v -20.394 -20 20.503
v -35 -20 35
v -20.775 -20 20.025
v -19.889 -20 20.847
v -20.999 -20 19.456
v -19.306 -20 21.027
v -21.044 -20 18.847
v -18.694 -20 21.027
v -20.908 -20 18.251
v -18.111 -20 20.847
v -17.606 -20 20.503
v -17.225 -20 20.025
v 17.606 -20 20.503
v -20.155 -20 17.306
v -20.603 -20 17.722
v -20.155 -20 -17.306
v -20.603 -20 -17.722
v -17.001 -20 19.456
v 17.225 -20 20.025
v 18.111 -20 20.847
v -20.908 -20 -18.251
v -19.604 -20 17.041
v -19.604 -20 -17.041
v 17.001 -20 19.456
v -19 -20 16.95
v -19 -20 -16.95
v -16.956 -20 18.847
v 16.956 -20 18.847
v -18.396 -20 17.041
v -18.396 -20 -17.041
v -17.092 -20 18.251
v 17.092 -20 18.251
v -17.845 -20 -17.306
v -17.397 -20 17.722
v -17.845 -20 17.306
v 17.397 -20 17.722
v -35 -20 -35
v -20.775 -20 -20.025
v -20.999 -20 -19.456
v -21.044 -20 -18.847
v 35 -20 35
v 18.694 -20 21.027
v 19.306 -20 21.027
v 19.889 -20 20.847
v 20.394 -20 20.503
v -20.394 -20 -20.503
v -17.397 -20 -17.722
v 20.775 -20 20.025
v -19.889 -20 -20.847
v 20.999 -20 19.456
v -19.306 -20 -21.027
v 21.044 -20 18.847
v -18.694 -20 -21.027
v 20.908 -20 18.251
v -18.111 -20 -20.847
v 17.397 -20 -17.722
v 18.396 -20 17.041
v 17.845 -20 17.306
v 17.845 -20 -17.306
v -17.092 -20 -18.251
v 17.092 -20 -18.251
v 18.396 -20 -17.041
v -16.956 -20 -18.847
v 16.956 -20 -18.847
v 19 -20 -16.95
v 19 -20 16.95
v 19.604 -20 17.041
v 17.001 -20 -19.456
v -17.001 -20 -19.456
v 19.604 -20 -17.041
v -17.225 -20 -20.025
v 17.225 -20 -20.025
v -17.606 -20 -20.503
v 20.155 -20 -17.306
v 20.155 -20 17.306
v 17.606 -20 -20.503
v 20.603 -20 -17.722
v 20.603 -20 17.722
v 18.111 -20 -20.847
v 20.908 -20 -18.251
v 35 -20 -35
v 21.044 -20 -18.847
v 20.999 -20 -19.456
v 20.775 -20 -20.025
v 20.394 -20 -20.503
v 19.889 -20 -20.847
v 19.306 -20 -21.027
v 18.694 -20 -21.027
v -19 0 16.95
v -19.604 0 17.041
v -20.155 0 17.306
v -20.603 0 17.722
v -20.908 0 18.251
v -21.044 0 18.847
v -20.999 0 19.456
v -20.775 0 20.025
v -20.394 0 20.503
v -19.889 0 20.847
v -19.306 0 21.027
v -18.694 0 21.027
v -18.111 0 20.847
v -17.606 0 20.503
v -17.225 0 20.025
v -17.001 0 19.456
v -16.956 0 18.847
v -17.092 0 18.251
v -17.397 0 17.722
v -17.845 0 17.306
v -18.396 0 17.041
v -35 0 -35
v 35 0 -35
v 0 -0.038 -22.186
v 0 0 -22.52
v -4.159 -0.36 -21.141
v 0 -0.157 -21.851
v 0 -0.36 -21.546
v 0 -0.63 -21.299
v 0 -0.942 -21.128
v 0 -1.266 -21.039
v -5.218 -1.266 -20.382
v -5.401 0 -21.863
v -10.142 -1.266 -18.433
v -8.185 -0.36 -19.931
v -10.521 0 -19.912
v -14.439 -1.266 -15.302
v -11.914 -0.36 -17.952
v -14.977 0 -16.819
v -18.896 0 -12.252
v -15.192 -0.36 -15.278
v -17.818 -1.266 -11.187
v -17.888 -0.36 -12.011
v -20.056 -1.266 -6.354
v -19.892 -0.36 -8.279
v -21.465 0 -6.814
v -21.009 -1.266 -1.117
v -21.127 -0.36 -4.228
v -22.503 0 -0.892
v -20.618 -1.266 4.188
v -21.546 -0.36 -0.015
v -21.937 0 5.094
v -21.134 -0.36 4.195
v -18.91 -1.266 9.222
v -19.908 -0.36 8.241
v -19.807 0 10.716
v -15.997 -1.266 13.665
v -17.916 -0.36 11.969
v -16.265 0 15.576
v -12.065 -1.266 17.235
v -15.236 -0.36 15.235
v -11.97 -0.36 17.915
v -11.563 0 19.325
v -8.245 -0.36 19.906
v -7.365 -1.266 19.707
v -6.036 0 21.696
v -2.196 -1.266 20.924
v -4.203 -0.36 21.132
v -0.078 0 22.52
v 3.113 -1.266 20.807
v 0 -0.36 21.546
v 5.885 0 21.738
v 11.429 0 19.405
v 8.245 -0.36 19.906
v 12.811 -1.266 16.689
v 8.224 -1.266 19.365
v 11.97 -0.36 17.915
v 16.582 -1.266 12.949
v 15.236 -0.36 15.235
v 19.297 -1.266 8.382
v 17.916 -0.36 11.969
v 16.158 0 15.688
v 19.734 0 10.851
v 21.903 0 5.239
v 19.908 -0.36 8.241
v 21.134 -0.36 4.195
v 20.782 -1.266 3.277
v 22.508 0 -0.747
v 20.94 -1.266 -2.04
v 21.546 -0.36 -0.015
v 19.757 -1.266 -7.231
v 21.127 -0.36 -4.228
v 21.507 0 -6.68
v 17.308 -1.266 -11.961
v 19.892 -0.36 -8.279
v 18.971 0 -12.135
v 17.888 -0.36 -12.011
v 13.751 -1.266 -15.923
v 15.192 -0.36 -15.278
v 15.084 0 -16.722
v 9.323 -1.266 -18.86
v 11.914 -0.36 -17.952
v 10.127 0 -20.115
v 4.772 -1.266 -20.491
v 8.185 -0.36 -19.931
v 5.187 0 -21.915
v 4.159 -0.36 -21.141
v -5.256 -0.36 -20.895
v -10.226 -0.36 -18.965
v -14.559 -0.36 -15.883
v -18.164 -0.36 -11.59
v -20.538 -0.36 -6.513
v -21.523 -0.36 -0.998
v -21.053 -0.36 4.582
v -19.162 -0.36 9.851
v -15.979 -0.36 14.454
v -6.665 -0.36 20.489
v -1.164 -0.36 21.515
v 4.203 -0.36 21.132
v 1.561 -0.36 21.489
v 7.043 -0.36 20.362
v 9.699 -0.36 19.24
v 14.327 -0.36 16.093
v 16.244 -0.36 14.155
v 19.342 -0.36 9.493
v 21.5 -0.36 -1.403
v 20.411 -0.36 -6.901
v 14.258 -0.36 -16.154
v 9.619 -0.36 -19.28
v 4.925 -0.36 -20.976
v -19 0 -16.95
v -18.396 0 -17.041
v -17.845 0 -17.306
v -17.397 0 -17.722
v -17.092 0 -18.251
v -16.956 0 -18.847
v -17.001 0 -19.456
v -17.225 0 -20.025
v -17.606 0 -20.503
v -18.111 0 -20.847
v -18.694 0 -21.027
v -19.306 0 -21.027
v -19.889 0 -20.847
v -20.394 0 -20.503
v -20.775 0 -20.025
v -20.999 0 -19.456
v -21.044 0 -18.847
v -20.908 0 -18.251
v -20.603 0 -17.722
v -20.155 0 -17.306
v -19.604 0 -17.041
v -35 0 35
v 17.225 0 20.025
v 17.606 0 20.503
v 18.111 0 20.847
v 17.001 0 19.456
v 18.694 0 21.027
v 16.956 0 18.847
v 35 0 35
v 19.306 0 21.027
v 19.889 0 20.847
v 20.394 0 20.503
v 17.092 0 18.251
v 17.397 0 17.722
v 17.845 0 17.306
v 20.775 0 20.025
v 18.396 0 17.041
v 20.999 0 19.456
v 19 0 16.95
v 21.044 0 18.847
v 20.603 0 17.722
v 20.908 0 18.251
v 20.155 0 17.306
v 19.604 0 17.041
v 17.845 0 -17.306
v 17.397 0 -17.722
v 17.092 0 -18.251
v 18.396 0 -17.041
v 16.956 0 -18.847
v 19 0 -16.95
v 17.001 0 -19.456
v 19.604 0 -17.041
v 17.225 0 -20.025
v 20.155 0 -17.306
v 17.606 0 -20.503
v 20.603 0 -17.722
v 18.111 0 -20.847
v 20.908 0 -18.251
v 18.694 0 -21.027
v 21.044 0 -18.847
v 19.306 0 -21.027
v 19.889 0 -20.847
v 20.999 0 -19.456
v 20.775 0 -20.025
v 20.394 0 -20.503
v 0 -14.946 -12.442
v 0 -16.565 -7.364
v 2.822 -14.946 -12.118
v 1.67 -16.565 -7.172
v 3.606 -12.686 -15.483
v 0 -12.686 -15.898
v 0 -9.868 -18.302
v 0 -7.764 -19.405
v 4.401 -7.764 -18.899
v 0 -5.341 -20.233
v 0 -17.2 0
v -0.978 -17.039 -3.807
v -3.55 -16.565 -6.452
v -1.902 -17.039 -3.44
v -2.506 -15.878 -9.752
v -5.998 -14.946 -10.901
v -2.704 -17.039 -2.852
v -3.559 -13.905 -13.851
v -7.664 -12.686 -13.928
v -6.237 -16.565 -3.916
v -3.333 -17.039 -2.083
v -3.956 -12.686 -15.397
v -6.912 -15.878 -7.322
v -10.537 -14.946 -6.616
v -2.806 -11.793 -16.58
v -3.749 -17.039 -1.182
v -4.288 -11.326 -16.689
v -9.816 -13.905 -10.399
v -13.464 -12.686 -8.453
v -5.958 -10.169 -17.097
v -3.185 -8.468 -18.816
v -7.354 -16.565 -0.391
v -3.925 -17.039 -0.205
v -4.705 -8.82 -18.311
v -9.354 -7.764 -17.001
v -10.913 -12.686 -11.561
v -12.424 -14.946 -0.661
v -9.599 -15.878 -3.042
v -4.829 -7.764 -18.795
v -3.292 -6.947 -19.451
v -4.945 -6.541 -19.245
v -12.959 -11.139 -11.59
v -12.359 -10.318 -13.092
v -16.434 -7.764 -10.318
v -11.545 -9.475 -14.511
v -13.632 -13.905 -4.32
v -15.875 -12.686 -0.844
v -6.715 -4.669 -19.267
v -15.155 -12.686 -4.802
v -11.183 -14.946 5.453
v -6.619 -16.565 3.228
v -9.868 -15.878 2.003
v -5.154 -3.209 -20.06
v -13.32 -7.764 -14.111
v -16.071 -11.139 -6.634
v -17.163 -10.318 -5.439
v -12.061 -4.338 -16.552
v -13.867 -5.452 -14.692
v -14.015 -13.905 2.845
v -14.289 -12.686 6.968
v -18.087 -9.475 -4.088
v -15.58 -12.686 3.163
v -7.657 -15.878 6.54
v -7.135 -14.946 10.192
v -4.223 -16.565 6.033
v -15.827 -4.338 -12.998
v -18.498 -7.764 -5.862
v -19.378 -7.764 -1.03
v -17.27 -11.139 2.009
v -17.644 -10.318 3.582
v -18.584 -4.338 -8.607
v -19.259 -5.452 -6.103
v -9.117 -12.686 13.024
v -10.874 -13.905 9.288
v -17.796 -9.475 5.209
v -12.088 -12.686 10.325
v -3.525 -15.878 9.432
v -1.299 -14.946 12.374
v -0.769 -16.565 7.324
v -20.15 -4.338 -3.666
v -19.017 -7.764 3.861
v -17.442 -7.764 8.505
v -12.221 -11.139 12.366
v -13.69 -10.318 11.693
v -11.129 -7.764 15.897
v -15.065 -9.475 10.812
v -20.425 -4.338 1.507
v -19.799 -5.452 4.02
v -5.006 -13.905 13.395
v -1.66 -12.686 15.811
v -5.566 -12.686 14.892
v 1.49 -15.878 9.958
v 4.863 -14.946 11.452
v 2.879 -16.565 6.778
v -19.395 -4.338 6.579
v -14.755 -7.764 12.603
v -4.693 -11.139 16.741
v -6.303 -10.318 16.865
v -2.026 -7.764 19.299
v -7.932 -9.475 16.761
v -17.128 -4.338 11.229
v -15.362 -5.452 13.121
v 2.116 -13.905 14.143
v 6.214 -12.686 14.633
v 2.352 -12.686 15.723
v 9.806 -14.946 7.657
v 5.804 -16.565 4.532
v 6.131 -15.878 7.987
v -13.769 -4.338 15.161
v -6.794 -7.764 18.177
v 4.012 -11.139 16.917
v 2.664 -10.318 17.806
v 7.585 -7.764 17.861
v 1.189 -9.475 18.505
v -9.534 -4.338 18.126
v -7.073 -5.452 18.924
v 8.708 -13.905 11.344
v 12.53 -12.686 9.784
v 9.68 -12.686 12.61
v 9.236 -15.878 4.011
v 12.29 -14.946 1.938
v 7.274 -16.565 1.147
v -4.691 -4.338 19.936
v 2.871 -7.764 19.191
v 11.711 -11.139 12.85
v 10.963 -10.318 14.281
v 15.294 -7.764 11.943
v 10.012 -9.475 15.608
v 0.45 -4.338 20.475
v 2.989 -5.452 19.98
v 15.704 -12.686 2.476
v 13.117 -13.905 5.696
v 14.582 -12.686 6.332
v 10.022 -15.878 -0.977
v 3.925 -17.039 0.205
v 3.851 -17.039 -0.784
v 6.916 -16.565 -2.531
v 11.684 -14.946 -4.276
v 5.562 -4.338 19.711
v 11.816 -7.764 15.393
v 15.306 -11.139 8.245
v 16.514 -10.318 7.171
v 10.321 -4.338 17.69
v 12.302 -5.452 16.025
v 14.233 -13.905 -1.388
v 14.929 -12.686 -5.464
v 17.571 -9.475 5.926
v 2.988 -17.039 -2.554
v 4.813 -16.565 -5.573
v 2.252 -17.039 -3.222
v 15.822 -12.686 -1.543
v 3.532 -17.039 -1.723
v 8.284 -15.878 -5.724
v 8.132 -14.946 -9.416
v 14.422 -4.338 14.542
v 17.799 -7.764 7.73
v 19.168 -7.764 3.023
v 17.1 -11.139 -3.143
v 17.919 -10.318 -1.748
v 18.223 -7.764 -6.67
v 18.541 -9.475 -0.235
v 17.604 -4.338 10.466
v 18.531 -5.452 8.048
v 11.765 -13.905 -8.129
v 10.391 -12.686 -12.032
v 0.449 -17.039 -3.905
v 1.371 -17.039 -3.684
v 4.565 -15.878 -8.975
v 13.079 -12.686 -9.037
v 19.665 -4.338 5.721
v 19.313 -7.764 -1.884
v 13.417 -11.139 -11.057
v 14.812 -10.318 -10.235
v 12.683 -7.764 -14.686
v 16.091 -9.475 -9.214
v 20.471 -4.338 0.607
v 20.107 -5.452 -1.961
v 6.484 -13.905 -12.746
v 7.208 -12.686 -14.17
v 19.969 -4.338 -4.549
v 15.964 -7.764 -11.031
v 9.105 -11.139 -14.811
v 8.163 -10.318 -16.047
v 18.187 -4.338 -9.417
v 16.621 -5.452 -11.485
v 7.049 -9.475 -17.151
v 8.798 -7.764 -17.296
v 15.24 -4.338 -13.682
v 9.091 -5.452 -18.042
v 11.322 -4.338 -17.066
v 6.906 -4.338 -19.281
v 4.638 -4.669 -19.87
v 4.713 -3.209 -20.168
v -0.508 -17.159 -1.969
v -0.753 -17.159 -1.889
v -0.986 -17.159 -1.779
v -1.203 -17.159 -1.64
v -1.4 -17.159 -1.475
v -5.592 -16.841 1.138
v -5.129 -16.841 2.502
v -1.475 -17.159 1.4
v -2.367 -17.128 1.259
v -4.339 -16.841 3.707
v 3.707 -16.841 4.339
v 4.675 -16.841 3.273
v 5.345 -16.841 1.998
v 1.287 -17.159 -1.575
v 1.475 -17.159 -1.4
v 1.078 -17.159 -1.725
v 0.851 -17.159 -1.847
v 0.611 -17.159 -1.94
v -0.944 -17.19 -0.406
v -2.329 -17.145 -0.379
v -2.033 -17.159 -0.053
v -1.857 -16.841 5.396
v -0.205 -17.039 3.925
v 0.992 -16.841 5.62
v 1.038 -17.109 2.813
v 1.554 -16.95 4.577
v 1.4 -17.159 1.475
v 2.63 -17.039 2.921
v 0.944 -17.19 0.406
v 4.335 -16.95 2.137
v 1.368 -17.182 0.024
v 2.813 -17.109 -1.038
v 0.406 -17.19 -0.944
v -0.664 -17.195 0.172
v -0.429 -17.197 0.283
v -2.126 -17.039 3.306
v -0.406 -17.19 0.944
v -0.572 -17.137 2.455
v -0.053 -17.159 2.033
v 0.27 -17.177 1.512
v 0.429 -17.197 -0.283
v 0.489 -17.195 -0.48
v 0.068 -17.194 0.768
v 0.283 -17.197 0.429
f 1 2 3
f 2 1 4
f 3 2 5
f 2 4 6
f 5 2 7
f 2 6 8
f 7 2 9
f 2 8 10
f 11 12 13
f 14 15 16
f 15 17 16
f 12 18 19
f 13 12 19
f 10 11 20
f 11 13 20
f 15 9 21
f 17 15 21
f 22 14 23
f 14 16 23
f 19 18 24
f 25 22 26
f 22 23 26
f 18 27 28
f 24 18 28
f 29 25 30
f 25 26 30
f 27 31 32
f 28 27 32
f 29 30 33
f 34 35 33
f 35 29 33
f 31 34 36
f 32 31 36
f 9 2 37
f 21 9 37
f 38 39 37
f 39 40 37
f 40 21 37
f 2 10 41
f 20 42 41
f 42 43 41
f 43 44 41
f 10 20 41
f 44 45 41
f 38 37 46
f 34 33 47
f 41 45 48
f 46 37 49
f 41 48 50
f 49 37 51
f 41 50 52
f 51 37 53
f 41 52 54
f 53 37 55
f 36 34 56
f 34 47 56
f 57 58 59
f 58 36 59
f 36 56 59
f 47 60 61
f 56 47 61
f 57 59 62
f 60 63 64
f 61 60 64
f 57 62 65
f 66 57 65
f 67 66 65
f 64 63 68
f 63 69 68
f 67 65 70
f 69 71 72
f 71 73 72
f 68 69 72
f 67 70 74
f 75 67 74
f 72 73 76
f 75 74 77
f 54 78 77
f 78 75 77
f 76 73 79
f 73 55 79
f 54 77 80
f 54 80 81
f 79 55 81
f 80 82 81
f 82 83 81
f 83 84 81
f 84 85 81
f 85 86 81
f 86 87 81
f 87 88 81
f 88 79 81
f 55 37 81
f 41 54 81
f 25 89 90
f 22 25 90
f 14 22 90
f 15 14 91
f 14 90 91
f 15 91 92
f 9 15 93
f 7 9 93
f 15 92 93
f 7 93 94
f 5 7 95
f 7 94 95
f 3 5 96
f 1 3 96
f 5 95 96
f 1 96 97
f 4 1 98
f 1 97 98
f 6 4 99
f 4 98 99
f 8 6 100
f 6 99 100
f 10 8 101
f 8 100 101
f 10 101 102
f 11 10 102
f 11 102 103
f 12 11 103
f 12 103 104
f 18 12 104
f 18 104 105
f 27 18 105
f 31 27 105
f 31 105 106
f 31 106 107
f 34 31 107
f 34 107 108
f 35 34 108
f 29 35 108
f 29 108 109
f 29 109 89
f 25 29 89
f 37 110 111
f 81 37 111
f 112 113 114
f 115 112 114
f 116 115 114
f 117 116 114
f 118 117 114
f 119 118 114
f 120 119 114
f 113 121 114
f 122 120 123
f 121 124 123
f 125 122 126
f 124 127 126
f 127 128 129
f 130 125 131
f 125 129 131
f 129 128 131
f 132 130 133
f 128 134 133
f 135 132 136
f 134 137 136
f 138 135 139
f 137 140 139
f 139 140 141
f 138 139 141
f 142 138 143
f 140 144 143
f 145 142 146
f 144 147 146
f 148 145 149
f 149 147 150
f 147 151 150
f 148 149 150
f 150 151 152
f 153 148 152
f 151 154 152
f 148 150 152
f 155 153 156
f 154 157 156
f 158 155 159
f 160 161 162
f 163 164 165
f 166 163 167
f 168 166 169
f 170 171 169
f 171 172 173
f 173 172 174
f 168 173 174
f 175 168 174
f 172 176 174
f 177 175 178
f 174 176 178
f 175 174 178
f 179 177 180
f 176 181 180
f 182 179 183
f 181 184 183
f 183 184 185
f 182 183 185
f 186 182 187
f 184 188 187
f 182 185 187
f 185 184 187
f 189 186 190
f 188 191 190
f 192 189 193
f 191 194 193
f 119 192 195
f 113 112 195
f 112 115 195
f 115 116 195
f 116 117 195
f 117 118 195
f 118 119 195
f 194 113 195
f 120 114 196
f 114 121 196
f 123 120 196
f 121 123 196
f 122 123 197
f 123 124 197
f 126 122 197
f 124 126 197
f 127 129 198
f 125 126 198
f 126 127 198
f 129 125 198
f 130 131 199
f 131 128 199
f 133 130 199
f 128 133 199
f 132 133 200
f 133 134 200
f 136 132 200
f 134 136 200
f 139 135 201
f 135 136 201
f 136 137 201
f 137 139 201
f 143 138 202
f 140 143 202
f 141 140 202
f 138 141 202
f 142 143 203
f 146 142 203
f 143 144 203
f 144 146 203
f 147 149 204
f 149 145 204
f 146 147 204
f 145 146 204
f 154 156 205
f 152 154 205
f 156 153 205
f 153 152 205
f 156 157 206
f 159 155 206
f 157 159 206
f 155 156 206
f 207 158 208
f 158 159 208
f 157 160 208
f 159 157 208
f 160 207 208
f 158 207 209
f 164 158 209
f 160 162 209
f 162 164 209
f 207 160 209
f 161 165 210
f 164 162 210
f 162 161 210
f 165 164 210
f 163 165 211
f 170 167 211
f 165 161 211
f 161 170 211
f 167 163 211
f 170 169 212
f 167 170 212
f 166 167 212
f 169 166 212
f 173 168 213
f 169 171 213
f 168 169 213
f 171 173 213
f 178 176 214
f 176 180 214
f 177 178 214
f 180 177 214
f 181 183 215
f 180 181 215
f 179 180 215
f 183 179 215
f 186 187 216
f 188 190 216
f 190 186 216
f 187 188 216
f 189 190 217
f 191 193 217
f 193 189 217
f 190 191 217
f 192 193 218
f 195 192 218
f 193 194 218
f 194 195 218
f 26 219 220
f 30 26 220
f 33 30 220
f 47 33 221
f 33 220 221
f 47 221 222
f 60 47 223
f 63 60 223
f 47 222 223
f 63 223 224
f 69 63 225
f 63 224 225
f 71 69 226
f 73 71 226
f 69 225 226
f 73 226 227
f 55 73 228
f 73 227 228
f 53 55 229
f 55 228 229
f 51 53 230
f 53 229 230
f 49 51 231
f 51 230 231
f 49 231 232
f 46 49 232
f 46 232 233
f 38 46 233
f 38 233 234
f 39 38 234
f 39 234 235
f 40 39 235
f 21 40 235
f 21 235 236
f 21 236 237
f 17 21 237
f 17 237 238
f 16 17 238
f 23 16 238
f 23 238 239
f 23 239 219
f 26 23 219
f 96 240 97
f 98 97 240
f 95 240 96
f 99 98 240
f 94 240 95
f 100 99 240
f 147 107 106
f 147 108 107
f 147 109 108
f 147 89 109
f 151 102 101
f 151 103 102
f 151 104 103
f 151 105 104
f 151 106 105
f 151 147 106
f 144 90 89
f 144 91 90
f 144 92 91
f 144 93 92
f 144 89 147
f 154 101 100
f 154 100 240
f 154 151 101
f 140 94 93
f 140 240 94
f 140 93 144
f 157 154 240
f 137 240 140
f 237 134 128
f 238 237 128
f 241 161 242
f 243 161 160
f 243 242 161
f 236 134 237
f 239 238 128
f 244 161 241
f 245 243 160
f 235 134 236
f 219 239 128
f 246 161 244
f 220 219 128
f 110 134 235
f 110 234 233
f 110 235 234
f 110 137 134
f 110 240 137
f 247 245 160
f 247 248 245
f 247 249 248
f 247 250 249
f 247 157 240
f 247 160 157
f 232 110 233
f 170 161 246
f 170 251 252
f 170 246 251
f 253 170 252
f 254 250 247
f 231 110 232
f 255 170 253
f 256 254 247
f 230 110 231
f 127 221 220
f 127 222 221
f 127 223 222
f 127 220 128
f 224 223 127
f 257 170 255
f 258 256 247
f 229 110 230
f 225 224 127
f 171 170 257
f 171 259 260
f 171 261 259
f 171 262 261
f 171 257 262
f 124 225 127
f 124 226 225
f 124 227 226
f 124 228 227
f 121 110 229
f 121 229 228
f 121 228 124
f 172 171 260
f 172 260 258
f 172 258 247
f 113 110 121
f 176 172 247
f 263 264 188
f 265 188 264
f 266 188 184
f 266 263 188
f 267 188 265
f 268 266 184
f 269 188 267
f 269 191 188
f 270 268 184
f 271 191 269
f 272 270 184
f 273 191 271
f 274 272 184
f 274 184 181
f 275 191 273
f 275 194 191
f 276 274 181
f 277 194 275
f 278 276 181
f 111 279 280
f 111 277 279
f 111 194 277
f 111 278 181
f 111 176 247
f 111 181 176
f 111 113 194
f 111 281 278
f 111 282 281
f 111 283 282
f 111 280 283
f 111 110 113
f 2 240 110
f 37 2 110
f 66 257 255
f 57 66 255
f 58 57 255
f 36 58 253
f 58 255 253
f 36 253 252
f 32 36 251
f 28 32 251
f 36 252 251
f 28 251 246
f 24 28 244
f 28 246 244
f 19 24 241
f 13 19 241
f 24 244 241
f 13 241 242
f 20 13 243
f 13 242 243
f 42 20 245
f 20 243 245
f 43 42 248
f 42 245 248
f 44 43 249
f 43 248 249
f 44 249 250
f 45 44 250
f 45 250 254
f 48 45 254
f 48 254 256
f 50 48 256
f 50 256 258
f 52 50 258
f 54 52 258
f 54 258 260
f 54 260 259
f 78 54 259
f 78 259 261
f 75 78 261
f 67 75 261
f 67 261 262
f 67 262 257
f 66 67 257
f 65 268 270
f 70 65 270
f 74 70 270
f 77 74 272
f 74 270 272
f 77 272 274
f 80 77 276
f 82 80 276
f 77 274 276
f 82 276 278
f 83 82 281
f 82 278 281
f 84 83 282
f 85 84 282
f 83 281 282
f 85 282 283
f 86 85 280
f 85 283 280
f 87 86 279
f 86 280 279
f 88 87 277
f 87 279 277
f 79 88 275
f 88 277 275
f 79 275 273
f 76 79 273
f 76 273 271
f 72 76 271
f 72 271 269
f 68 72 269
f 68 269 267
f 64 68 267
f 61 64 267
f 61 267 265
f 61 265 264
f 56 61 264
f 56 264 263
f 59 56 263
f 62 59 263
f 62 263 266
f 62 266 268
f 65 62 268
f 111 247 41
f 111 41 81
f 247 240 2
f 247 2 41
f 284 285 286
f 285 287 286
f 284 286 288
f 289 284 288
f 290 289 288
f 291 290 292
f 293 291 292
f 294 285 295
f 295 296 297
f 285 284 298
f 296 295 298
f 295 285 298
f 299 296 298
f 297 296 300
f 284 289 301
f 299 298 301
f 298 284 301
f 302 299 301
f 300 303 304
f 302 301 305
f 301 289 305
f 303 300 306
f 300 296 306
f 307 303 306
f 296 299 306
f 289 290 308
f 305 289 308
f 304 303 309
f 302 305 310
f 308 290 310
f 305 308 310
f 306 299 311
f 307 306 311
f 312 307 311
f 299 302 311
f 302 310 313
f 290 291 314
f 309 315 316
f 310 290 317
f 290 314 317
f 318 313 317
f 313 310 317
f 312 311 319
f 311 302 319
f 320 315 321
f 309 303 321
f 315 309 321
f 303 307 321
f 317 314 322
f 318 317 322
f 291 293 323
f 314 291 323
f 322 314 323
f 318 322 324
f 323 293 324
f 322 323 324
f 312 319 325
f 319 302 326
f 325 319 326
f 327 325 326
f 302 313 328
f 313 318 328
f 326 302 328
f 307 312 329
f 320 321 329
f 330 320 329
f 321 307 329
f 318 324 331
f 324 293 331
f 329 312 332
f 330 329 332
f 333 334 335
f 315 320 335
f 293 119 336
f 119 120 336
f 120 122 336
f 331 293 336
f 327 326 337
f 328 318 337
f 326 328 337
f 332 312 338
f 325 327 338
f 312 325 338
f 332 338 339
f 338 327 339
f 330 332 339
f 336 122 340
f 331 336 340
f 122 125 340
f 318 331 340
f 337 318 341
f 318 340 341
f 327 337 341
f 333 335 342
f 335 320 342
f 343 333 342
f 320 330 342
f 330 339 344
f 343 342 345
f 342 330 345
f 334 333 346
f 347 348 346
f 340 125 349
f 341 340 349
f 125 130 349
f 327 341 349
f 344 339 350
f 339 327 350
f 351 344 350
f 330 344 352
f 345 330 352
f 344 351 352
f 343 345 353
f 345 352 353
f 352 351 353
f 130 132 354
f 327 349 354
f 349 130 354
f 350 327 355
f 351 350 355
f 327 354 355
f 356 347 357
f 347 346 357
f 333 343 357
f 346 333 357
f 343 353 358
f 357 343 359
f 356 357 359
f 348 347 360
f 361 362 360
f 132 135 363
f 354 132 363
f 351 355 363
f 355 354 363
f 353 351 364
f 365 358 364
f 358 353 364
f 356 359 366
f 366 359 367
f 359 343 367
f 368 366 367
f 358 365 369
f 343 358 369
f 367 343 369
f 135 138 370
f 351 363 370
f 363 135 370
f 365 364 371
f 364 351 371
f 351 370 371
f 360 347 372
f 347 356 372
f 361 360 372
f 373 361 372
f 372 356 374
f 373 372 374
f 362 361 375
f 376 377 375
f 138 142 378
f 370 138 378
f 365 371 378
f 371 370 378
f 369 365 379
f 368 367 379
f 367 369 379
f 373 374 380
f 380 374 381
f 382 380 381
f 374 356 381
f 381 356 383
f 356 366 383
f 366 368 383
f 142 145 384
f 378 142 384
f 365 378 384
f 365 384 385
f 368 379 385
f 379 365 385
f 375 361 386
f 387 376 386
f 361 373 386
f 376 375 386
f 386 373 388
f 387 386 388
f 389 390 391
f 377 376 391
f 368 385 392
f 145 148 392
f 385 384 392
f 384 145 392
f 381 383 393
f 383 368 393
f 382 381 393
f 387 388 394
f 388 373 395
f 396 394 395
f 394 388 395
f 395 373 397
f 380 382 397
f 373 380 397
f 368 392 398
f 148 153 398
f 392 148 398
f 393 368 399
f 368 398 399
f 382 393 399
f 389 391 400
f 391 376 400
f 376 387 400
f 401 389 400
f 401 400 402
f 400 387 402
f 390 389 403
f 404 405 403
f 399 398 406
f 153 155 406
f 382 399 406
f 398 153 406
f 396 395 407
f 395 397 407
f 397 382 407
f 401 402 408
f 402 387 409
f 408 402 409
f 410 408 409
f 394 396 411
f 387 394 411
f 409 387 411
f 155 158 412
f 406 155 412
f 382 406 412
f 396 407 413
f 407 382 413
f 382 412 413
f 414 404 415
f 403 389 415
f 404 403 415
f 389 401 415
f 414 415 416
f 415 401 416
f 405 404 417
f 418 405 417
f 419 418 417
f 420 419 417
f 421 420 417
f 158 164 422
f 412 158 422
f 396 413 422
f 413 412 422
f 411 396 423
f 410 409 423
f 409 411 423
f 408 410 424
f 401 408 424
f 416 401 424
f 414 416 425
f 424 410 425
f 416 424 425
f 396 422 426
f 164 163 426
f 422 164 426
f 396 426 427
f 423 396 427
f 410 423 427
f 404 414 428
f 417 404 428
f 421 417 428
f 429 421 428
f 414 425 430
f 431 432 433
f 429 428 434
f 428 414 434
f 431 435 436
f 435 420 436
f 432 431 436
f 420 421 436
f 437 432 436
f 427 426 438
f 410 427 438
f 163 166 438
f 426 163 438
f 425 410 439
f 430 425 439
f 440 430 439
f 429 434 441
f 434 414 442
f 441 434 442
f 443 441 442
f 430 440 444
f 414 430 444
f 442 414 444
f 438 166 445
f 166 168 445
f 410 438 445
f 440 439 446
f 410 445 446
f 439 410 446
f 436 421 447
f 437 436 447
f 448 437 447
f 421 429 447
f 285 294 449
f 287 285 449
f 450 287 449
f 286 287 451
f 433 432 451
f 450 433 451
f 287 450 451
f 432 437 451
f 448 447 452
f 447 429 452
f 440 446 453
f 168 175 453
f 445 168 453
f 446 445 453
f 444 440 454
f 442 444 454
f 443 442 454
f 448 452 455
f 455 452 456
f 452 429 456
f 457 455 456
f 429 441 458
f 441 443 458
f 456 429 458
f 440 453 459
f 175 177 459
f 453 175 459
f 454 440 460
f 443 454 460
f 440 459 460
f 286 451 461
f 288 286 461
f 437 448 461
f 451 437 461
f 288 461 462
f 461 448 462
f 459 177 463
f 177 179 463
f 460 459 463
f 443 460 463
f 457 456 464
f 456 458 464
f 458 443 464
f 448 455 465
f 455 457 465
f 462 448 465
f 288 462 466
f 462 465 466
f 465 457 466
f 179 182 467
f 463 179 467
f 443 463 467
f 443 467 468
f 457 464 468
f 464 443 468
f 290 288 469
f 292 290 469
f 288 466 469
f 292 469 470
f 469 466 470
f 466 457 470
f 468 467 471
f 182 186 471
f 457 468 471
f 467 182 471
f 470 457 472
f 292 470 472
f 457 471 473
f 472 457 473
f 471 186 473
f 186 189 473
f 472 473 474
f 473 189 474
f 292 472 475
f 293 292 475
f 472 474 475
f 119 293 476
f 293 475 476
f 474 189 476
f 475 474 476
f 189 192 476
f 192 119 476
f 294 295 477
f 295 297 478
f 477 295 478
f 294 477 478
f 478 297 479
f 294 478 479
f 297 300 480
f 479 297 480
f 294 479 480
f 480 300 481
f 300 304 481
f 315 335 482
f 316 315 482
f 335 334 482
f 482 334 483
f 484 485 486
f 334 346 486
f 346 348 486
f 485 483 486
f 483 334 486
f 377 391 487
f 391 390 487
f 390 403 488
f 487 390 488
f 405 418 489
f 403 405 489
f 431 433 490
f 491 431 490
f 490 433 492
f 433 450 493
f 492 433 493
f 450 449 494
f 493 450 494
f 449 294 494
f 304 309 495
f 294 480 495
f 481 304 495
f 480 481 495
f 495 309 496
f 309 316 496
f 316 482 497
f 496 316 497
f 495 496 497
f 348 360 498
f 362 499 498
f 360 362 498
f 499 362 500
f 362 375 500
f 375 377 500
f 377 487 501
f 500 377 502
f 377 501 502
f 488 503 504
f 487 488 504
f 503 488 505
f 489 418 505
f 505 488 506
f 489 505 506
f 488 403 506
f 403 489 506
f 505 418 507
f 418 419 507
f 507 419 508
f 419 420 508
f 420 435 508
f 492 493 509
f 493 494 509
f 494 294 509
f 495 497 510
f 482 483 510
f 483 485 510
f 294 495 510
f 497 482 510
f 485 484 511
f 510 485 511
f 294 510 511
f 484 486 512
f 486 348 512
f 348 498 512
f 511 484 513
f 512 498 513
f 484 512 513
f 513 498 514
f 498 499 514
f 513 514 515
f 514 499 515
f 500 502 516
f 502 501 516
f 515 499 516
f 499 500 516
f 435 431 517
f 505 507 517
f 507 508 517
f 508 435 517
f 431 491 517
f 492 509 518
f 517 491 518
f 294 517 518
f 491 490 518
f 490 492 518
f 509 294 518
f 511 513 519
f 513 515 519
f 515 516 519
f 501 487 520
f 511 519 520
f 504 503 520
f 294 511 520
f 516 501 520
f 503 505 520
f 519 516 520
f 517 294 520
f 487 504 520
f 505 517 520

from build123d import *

# Parameters (mm, degrees)
SKETCH2_W           = 70
SKETCH2_H           = 70
BOSS_EXTRUDE1_DEPTH = 20
FILLET1_R           = 1.5
SKETCH3_R           = 2.05
CUT_EXTRUDE1_DEPTH  = 54.385391391


with BuildPart() as part:
    # Sketch2 → Boss-Extrude1 (new body)
    with BuildSketch(Plane(origin=(0, 0, 0), x_dir=(1, 0, 0), z_dir=(0, 1, 0))):
        Rectangle(SKETCH2_W, SKETCH2_H)
    extrude(amount=-BOSS_EXTRUDE1_DEPTH)

    # Sketch1 → Cut-Revolve1 (revolve, cut)
    with BuildSketch(Plane.XY, mode=Mode.PRIVATE) as cut_revolve1_sk:
        with BuildLine():
            Line((0, -17.2), (0, 0))
            Line((0, 0), (21.241684944, 0))
            Line((21.241684944, 0), (21.158851084, -0.511526958))
            add(Edge.make_bspline(
                [(0, -17.2), (0.530678283, -17.2), (1.61157482, -17.183508716), (3.615531125, -17.08588663), (5.944127269, -16.844919371), (8.44843367, -16.370131279), (11.442656399, -15.492934033), (14.579654851, -13.93724298), (17.382164488, -11.402739011), (19.199009229, -8.500896664), (20.23569058, -5.583194157), (20.706490619, -3.313387562), (20.981886079, -1.635929169), (21.096876841, -0.894238762), (21.158851084, -0.511526958)],
                knots=[0, 0, 0, 0, 0.03125, 0.0625, 0.125, 0.1875, 0.25, 0.375, 0.5, 0.625, 0.75, 0.875, 0.9375, 1, 1, 1, 1], degree=3))
        make_face()
    revolve(cut_revolve1_sk.sketch.rotate(Axis((0, -17.2, 0), (0, 1, 0)), 90), axis=Axis((0, -17.2, 0), (0, 1, 0)), mode=Mode.SUBTRACT)

    # Fillet1
    fillet1_edges = [part.edges().sort_by_distance(p)[0] for p in [
        (0, 0, 21.241684944),
    ]]
    fillet(fillet1_edges, radius=FILLET1_R)

    # Sketch3 → Cut-Extrude1 (cut, through all)
    with BuildSketch(Plane(origin=(0, 0, 0), x_dir=(1, 0, 0), z_dir=(0, 1, 0))):
        with Locations(Location((-19, 19, 0), (0, 0, 270))):
            Circle(SKETCH3_R)
        with Locations(Location((19, -19, 0), (0, 0, 90))):
            Circle(SKETCH3_R)
        with Locations(Location((-19, -19, 0), (0, 0, 90))):
            Circle(SKETCH3_R)
        with Locations(Location((19, 19, 0), (0, 0, 270))):
            Circle(SKETCH3_R)
    extrude(amount=-CUT_EXTRUDE1_DEPTH, mode=Mode.SUBTRACT)


solid = part.part
